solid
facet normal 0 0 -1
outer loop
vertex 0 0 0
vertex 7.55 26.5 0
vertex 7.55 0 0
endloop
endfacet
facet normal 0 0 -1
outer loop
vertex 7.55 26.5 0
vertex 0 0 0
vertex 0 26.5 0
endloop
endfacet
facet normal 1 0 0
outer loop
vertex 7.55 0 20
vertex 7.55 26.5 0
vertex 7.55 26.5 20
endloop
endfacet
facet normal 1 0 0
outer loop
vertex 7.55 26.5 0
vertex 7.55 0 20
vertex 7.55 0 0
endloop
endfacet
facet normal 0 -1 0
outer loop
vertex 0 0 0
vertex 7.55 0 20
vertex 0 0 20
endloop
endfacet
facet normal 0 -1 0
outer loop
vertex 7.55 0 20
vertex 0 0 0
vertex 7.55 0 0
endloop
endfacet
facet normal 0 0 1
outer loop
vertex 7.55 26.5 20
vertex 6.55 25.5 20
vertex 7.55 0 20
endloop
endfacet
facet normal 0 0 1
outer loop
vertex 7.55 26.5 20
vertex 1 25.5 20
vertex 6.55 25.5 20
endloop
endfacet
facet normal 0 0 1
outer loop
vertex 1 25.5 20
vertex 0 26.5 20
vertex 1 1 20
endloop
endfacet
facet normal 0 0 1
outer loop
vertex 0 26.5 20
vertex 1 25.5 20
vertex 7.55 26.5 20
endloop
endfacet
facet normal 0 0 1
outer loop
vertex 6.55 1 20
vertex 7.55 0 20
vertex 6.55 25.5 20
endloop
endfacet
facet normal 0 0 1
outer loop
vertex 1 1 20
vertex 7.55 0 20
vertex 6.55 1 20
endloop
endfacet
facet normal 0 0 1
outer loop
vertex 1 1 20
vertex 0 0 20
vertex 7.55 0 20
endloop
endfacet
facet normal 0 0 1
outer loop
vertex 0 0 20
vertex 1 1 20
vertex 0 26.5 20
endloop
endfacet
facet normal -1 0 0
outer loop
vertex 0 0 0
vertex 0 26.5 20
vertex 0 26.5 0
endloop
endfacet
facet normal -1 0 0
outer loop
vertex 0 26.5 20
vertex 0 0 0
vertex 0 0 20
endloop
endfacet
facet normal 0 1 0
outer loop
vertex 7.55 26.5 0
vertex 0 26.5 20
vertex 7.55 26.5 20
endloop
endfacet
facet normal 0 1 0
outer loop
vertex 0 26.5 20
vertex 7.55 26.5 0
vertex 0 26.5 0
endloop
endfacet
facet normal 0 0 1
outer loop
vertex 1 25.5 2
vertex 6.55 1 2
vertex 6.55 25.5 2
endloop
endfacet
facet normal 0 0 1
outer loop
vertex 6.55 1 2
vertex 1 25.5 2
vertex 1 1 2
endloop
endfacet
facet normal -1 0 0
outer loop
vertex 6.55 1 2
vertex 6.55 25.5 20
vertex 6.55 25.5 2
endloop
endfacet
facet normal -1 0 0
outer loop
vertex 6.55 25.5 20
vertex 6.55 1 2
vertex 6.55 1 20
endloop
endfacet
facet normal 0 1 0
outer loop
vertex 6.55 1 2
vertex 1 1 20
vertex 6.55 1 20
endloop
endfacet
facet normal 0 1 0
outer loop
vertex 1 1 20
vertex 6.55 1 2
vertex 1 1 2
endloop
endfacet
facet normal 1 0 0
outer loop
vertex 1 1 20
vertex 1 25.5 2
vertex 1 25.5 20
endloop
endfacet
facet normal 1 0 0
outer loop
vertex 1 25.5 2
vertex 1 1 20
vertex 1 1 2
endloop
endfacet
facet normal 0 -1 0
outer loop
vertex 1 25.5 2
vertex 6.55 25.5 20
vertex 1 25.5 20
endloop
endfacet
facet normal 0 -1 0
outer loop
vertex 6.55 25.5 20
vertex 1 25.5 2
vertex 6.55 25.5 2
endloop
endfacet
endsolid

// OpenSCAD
width = 24.5;
thickness =5.55;
border = 2;
height = 18;
bottom = 2;

difference() {
	linear_extrude(height=bottom+height) {
		polygon([[0,0],[0,width+border],[thickness+border,width+border],[thickness+border,0]]);
	}

	translate([border/2,border/2,bottom]) {
		linear_extrude(height=height+1) {
			polygon([[0,0],[0,width],[thickness,width],[thickness,0]]);
		}
	}
}
